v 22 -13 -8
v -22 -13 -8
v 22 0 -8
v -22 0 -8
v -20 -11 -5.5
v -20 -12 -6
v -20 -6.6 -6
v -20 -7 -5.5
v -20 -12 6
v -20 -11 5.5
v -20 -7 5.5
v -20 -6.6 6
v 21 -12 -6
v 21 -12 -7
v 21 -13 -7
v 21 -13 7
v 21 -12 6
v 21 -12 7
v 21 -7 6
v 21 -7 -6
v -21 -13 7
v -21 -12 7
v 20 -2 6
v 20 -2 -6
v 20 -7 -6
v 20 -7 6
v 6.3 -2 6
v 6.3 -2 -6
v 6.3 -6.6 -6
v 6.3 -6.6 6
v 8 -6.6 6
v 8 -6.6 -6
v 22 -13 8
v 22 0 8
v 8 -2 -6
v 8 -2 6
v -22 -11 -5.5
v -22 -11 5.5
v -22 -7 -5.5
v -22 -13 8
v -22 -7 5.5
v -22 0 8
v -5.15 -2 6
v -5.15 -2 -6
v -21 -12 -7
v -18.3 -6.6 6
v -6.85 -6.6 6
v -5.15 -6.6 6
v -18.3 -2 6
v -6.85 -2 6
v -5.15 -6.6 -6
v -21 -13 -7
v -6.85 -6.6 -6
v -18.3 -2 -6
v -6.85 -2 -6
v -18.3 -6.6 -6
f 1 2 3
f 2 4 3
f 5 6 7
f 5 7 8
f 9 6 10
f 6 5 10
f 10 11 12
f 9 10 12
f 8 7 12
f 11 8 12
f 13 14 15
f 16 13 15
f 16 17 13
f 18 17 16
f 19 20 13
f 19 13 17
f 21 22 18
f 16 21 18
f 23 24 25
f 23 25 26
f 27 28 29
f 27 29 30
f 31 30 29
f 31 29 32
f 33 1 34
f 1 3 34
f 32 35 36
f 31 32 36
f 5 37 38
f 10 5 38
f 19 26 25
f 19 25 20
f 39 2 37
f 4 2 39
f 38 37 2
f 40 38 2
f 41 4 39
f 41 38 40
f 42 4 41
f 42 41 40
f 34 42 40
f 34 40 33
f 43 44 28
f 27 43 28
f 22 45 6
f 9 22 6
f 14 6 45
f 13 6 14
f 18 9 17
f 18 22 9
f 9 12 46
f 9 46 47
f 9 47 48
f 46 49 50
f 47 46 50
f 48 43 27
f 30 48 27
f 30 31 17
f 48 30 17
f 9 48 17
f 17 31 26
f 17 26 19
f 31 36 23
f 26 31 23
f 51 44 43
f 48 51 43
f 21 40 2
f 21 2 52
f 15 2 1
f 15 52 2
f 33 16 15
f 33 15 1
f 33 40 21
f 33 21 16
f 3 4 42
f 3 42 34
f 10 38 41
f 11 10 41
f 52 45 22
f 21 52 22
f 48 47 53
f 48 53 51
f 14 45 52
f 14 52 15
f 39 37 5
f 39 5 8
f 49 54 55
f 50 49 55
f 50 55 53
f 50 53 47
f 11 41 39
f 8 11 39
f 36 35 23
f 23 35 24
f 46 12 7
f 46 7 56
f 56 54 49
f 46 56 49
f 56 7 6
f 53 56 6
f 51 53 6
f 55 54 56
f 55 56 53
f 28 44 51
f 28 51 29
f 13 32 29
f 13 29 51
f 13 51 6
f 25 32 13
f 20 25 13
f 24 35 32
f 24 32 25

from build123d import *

# Parameters (mm, degrees)
SKETCH_1_W          = 44
SKETCH_1_H          = 16
EXTRUDE_1_DEPTH     = 2
SKETCH_2_W          = 44
SKETCH_2_H          = 16
SKETCH_2_W_2        = 40
SKETCH_2_H_2        = 12
EXTRUDE_2_DEPTH     = 10
SKETCH_3_W          = 5.5
SKETCH_3_H          = 4
CUT_EXTRUDE_1_DEPTH = 2
SKETCH_4_W          = 1.7
SKETCH_4_H          = 12
EXTRUDE_4_DEPTH     = 4.6
SKETCH_9_W          = 44
SKETCH_9_H          = 16
SKETCH_9_W_2        = 42
SKETCH_9_H_2        = 14
EXTRUDE_5_DEPTH     = 1
SKETCH_12_W         = 1
SKETCH_12_H         = 12
CUT_EXTRUDE_3_DEPTH = 5


with BuildPart() as part:
    # 草图1 → 凸台-拉伸1 (new body)
    with BuildSketch(Plane(origin=(0, 0, 0), x_dir=(1, 0, 0), z_dir=(0, 1, 0))):
        Rectangle(SKETCH_1_W, SKETCH_1_H)
    extrude(amount=-EXTRUDE_1_DEPTH)

    # 草图2 → 凸台-拉伸2 (add)
    with BuildSketch(Plane.XZ.offset(2)):
        Rectangle(SKETCH_2_W, SKETCH_2_H)
        Rectangle(SKETCH_2_W_2, SKETCH_2_H_2, mode=Mode.SUBTRACT)
    extrude(amount=EXTRUDE_2_DEPTH)

    # 草图3 → 切除-拉伸1 (cut)
    with BuildSketch(Plane.ZY.offset(22)):
        with Locations((2.75, -9)):
            Rectangle(SKETCH_3_W, SKETCH_3_H)
        with Locations((-2.75, -9)):
            Rectangle(SKETCH_3_W, SKETCH_3_H)
    extrude(amount=-CUT_EXTRUDE_1_DEPTH, mode=Mode.SUBTRACT)

    # 草图4 → 凸台-拉伸4 (add)
    with BuildSketch(Plane.XZ.offset(2)):
        with Locations((7.15, 0)):
            Rectangle(SKETCH_4_W, SKETCH_4_H)
        with Locations((-19.15, 0)):
            Rectangle(SKETCH_4_W, SKETCH_4_H)
        with Locations((-6, 0)):
            Rectangle(SKETCH_4_W, SKETCH_4_H)
    extrude(amount=EXTRUDE_4_DEPTH)

    # 草图9 → 凸台-拉伸5 (add)
    with BuildSketch(Plane.XZ.offset(12)):
        Rectangle(SKETCH_9_W, SKETCH_9_H)
        Rectangle(SKETCH_9_W_2, SKETCH_9_H_2, mode=Mode.SUBTRACT)
    extrude(amount=EXTRUDE_5_DEPTH)

    # 草图12 → 切除-拉伸3 (cut)
    with BuildSketch(Plane.XZ.offset(12)):
        with Locations((20.5, 0)):
            Rectangle(SKETCH_12_W, SKETCH_12_H)
    extrude(amount=-CUT_EXTRUDE_3_DEPTH, mode=Mode.SUBTRACT)


solid = part.part
